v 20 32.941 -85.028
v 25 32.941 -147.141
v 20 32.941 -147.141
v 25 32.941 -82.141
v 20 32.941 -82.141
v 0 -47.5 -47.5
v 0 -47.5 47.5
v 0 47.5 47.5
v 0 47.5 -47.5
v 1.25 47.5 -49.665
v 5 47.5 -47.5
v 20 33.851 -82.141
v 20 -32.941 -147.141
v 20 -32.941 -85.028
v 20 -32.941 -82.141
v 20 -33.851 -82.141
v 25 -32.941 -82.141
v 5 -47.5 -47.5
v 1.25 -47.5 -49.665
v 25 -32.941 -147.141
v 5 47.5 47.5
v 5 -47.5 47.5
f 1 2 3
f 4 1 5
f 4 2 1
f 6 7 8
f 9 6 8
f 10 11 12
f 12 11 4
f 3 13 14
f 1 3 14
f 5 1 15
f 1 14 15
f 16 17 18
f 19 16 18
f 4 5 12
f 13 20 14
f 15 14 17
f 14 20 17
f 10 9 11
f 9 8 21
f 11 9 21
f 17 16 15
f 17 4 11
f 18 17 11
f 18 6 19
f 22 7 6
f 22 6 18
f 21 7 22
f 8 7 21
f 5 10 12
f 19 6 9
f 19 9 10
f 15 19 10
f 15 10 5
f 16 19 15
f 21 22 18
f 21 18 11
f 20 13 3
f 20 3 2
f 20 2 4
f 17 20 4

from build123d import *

# Parameters (mm, degrees)
F0_W     = 95
F0_H     = 95
F1_DEPTH = 5
F2_W     = 5
F2_H     = 65
F3_DEPTH = 95
F5_DEPTH = 25.4
F6_W     = 14.558809
F6_H     = 65
F7_DEPTH = 25.4


with BuildPart() as f1:
    # F0 (on Right) → F1 (new body)
    with BuildSketch(Plane.YZ):
        Rectangle(F0_W, F0_H)
    extrude(amount=F1_DEPTH)

    # F2 (on face) → F3 (join, through all)
    with BuildSketch(Plane.XZ.offset(47.5)):
        Polygon((25, -82.141016), (5, -47.5), (0, -47.5), (20, -82.141016), align=None)
        with Locations((22.5, -114.641016)):
            Rectangle(F2_W, F2_H)
    extrude(amount=-F3_DEPTH)

    # F4 (on face) → F5 (cut)
    with BuildSketch(Plane(origin=(-16.818103, 0, -9.709936), x_dir=(0, 1, 0), z_dir=(0.866025, 0, 0.5))):
        Polygon((-32.941191, -83.636207), (-47.5, -43.636207), (-47.5, -83.636207), align=None)
        Polygon((47.5, -83.636207), (47.5, -43.636207), (32.941191, -83.636207), align=None)
    extrude(amount=-F5_DEPTH, mode=Mode.SUBTRACT)

    # F6 (on face) → F7 (cut)
    with BuildSketch(Plane.YZ.offset(25)):
        with Locations((-40.220596, -114.641016)):
            Rectangle(F6_W, F6_H)
        with Locations((40.220596, -114.641016)):
            Rectangle(F6_W, F6_H)
    extrude(amount=-F7_DEPTH, mode=Mode.SUBTRACT)


solid = f1.part
